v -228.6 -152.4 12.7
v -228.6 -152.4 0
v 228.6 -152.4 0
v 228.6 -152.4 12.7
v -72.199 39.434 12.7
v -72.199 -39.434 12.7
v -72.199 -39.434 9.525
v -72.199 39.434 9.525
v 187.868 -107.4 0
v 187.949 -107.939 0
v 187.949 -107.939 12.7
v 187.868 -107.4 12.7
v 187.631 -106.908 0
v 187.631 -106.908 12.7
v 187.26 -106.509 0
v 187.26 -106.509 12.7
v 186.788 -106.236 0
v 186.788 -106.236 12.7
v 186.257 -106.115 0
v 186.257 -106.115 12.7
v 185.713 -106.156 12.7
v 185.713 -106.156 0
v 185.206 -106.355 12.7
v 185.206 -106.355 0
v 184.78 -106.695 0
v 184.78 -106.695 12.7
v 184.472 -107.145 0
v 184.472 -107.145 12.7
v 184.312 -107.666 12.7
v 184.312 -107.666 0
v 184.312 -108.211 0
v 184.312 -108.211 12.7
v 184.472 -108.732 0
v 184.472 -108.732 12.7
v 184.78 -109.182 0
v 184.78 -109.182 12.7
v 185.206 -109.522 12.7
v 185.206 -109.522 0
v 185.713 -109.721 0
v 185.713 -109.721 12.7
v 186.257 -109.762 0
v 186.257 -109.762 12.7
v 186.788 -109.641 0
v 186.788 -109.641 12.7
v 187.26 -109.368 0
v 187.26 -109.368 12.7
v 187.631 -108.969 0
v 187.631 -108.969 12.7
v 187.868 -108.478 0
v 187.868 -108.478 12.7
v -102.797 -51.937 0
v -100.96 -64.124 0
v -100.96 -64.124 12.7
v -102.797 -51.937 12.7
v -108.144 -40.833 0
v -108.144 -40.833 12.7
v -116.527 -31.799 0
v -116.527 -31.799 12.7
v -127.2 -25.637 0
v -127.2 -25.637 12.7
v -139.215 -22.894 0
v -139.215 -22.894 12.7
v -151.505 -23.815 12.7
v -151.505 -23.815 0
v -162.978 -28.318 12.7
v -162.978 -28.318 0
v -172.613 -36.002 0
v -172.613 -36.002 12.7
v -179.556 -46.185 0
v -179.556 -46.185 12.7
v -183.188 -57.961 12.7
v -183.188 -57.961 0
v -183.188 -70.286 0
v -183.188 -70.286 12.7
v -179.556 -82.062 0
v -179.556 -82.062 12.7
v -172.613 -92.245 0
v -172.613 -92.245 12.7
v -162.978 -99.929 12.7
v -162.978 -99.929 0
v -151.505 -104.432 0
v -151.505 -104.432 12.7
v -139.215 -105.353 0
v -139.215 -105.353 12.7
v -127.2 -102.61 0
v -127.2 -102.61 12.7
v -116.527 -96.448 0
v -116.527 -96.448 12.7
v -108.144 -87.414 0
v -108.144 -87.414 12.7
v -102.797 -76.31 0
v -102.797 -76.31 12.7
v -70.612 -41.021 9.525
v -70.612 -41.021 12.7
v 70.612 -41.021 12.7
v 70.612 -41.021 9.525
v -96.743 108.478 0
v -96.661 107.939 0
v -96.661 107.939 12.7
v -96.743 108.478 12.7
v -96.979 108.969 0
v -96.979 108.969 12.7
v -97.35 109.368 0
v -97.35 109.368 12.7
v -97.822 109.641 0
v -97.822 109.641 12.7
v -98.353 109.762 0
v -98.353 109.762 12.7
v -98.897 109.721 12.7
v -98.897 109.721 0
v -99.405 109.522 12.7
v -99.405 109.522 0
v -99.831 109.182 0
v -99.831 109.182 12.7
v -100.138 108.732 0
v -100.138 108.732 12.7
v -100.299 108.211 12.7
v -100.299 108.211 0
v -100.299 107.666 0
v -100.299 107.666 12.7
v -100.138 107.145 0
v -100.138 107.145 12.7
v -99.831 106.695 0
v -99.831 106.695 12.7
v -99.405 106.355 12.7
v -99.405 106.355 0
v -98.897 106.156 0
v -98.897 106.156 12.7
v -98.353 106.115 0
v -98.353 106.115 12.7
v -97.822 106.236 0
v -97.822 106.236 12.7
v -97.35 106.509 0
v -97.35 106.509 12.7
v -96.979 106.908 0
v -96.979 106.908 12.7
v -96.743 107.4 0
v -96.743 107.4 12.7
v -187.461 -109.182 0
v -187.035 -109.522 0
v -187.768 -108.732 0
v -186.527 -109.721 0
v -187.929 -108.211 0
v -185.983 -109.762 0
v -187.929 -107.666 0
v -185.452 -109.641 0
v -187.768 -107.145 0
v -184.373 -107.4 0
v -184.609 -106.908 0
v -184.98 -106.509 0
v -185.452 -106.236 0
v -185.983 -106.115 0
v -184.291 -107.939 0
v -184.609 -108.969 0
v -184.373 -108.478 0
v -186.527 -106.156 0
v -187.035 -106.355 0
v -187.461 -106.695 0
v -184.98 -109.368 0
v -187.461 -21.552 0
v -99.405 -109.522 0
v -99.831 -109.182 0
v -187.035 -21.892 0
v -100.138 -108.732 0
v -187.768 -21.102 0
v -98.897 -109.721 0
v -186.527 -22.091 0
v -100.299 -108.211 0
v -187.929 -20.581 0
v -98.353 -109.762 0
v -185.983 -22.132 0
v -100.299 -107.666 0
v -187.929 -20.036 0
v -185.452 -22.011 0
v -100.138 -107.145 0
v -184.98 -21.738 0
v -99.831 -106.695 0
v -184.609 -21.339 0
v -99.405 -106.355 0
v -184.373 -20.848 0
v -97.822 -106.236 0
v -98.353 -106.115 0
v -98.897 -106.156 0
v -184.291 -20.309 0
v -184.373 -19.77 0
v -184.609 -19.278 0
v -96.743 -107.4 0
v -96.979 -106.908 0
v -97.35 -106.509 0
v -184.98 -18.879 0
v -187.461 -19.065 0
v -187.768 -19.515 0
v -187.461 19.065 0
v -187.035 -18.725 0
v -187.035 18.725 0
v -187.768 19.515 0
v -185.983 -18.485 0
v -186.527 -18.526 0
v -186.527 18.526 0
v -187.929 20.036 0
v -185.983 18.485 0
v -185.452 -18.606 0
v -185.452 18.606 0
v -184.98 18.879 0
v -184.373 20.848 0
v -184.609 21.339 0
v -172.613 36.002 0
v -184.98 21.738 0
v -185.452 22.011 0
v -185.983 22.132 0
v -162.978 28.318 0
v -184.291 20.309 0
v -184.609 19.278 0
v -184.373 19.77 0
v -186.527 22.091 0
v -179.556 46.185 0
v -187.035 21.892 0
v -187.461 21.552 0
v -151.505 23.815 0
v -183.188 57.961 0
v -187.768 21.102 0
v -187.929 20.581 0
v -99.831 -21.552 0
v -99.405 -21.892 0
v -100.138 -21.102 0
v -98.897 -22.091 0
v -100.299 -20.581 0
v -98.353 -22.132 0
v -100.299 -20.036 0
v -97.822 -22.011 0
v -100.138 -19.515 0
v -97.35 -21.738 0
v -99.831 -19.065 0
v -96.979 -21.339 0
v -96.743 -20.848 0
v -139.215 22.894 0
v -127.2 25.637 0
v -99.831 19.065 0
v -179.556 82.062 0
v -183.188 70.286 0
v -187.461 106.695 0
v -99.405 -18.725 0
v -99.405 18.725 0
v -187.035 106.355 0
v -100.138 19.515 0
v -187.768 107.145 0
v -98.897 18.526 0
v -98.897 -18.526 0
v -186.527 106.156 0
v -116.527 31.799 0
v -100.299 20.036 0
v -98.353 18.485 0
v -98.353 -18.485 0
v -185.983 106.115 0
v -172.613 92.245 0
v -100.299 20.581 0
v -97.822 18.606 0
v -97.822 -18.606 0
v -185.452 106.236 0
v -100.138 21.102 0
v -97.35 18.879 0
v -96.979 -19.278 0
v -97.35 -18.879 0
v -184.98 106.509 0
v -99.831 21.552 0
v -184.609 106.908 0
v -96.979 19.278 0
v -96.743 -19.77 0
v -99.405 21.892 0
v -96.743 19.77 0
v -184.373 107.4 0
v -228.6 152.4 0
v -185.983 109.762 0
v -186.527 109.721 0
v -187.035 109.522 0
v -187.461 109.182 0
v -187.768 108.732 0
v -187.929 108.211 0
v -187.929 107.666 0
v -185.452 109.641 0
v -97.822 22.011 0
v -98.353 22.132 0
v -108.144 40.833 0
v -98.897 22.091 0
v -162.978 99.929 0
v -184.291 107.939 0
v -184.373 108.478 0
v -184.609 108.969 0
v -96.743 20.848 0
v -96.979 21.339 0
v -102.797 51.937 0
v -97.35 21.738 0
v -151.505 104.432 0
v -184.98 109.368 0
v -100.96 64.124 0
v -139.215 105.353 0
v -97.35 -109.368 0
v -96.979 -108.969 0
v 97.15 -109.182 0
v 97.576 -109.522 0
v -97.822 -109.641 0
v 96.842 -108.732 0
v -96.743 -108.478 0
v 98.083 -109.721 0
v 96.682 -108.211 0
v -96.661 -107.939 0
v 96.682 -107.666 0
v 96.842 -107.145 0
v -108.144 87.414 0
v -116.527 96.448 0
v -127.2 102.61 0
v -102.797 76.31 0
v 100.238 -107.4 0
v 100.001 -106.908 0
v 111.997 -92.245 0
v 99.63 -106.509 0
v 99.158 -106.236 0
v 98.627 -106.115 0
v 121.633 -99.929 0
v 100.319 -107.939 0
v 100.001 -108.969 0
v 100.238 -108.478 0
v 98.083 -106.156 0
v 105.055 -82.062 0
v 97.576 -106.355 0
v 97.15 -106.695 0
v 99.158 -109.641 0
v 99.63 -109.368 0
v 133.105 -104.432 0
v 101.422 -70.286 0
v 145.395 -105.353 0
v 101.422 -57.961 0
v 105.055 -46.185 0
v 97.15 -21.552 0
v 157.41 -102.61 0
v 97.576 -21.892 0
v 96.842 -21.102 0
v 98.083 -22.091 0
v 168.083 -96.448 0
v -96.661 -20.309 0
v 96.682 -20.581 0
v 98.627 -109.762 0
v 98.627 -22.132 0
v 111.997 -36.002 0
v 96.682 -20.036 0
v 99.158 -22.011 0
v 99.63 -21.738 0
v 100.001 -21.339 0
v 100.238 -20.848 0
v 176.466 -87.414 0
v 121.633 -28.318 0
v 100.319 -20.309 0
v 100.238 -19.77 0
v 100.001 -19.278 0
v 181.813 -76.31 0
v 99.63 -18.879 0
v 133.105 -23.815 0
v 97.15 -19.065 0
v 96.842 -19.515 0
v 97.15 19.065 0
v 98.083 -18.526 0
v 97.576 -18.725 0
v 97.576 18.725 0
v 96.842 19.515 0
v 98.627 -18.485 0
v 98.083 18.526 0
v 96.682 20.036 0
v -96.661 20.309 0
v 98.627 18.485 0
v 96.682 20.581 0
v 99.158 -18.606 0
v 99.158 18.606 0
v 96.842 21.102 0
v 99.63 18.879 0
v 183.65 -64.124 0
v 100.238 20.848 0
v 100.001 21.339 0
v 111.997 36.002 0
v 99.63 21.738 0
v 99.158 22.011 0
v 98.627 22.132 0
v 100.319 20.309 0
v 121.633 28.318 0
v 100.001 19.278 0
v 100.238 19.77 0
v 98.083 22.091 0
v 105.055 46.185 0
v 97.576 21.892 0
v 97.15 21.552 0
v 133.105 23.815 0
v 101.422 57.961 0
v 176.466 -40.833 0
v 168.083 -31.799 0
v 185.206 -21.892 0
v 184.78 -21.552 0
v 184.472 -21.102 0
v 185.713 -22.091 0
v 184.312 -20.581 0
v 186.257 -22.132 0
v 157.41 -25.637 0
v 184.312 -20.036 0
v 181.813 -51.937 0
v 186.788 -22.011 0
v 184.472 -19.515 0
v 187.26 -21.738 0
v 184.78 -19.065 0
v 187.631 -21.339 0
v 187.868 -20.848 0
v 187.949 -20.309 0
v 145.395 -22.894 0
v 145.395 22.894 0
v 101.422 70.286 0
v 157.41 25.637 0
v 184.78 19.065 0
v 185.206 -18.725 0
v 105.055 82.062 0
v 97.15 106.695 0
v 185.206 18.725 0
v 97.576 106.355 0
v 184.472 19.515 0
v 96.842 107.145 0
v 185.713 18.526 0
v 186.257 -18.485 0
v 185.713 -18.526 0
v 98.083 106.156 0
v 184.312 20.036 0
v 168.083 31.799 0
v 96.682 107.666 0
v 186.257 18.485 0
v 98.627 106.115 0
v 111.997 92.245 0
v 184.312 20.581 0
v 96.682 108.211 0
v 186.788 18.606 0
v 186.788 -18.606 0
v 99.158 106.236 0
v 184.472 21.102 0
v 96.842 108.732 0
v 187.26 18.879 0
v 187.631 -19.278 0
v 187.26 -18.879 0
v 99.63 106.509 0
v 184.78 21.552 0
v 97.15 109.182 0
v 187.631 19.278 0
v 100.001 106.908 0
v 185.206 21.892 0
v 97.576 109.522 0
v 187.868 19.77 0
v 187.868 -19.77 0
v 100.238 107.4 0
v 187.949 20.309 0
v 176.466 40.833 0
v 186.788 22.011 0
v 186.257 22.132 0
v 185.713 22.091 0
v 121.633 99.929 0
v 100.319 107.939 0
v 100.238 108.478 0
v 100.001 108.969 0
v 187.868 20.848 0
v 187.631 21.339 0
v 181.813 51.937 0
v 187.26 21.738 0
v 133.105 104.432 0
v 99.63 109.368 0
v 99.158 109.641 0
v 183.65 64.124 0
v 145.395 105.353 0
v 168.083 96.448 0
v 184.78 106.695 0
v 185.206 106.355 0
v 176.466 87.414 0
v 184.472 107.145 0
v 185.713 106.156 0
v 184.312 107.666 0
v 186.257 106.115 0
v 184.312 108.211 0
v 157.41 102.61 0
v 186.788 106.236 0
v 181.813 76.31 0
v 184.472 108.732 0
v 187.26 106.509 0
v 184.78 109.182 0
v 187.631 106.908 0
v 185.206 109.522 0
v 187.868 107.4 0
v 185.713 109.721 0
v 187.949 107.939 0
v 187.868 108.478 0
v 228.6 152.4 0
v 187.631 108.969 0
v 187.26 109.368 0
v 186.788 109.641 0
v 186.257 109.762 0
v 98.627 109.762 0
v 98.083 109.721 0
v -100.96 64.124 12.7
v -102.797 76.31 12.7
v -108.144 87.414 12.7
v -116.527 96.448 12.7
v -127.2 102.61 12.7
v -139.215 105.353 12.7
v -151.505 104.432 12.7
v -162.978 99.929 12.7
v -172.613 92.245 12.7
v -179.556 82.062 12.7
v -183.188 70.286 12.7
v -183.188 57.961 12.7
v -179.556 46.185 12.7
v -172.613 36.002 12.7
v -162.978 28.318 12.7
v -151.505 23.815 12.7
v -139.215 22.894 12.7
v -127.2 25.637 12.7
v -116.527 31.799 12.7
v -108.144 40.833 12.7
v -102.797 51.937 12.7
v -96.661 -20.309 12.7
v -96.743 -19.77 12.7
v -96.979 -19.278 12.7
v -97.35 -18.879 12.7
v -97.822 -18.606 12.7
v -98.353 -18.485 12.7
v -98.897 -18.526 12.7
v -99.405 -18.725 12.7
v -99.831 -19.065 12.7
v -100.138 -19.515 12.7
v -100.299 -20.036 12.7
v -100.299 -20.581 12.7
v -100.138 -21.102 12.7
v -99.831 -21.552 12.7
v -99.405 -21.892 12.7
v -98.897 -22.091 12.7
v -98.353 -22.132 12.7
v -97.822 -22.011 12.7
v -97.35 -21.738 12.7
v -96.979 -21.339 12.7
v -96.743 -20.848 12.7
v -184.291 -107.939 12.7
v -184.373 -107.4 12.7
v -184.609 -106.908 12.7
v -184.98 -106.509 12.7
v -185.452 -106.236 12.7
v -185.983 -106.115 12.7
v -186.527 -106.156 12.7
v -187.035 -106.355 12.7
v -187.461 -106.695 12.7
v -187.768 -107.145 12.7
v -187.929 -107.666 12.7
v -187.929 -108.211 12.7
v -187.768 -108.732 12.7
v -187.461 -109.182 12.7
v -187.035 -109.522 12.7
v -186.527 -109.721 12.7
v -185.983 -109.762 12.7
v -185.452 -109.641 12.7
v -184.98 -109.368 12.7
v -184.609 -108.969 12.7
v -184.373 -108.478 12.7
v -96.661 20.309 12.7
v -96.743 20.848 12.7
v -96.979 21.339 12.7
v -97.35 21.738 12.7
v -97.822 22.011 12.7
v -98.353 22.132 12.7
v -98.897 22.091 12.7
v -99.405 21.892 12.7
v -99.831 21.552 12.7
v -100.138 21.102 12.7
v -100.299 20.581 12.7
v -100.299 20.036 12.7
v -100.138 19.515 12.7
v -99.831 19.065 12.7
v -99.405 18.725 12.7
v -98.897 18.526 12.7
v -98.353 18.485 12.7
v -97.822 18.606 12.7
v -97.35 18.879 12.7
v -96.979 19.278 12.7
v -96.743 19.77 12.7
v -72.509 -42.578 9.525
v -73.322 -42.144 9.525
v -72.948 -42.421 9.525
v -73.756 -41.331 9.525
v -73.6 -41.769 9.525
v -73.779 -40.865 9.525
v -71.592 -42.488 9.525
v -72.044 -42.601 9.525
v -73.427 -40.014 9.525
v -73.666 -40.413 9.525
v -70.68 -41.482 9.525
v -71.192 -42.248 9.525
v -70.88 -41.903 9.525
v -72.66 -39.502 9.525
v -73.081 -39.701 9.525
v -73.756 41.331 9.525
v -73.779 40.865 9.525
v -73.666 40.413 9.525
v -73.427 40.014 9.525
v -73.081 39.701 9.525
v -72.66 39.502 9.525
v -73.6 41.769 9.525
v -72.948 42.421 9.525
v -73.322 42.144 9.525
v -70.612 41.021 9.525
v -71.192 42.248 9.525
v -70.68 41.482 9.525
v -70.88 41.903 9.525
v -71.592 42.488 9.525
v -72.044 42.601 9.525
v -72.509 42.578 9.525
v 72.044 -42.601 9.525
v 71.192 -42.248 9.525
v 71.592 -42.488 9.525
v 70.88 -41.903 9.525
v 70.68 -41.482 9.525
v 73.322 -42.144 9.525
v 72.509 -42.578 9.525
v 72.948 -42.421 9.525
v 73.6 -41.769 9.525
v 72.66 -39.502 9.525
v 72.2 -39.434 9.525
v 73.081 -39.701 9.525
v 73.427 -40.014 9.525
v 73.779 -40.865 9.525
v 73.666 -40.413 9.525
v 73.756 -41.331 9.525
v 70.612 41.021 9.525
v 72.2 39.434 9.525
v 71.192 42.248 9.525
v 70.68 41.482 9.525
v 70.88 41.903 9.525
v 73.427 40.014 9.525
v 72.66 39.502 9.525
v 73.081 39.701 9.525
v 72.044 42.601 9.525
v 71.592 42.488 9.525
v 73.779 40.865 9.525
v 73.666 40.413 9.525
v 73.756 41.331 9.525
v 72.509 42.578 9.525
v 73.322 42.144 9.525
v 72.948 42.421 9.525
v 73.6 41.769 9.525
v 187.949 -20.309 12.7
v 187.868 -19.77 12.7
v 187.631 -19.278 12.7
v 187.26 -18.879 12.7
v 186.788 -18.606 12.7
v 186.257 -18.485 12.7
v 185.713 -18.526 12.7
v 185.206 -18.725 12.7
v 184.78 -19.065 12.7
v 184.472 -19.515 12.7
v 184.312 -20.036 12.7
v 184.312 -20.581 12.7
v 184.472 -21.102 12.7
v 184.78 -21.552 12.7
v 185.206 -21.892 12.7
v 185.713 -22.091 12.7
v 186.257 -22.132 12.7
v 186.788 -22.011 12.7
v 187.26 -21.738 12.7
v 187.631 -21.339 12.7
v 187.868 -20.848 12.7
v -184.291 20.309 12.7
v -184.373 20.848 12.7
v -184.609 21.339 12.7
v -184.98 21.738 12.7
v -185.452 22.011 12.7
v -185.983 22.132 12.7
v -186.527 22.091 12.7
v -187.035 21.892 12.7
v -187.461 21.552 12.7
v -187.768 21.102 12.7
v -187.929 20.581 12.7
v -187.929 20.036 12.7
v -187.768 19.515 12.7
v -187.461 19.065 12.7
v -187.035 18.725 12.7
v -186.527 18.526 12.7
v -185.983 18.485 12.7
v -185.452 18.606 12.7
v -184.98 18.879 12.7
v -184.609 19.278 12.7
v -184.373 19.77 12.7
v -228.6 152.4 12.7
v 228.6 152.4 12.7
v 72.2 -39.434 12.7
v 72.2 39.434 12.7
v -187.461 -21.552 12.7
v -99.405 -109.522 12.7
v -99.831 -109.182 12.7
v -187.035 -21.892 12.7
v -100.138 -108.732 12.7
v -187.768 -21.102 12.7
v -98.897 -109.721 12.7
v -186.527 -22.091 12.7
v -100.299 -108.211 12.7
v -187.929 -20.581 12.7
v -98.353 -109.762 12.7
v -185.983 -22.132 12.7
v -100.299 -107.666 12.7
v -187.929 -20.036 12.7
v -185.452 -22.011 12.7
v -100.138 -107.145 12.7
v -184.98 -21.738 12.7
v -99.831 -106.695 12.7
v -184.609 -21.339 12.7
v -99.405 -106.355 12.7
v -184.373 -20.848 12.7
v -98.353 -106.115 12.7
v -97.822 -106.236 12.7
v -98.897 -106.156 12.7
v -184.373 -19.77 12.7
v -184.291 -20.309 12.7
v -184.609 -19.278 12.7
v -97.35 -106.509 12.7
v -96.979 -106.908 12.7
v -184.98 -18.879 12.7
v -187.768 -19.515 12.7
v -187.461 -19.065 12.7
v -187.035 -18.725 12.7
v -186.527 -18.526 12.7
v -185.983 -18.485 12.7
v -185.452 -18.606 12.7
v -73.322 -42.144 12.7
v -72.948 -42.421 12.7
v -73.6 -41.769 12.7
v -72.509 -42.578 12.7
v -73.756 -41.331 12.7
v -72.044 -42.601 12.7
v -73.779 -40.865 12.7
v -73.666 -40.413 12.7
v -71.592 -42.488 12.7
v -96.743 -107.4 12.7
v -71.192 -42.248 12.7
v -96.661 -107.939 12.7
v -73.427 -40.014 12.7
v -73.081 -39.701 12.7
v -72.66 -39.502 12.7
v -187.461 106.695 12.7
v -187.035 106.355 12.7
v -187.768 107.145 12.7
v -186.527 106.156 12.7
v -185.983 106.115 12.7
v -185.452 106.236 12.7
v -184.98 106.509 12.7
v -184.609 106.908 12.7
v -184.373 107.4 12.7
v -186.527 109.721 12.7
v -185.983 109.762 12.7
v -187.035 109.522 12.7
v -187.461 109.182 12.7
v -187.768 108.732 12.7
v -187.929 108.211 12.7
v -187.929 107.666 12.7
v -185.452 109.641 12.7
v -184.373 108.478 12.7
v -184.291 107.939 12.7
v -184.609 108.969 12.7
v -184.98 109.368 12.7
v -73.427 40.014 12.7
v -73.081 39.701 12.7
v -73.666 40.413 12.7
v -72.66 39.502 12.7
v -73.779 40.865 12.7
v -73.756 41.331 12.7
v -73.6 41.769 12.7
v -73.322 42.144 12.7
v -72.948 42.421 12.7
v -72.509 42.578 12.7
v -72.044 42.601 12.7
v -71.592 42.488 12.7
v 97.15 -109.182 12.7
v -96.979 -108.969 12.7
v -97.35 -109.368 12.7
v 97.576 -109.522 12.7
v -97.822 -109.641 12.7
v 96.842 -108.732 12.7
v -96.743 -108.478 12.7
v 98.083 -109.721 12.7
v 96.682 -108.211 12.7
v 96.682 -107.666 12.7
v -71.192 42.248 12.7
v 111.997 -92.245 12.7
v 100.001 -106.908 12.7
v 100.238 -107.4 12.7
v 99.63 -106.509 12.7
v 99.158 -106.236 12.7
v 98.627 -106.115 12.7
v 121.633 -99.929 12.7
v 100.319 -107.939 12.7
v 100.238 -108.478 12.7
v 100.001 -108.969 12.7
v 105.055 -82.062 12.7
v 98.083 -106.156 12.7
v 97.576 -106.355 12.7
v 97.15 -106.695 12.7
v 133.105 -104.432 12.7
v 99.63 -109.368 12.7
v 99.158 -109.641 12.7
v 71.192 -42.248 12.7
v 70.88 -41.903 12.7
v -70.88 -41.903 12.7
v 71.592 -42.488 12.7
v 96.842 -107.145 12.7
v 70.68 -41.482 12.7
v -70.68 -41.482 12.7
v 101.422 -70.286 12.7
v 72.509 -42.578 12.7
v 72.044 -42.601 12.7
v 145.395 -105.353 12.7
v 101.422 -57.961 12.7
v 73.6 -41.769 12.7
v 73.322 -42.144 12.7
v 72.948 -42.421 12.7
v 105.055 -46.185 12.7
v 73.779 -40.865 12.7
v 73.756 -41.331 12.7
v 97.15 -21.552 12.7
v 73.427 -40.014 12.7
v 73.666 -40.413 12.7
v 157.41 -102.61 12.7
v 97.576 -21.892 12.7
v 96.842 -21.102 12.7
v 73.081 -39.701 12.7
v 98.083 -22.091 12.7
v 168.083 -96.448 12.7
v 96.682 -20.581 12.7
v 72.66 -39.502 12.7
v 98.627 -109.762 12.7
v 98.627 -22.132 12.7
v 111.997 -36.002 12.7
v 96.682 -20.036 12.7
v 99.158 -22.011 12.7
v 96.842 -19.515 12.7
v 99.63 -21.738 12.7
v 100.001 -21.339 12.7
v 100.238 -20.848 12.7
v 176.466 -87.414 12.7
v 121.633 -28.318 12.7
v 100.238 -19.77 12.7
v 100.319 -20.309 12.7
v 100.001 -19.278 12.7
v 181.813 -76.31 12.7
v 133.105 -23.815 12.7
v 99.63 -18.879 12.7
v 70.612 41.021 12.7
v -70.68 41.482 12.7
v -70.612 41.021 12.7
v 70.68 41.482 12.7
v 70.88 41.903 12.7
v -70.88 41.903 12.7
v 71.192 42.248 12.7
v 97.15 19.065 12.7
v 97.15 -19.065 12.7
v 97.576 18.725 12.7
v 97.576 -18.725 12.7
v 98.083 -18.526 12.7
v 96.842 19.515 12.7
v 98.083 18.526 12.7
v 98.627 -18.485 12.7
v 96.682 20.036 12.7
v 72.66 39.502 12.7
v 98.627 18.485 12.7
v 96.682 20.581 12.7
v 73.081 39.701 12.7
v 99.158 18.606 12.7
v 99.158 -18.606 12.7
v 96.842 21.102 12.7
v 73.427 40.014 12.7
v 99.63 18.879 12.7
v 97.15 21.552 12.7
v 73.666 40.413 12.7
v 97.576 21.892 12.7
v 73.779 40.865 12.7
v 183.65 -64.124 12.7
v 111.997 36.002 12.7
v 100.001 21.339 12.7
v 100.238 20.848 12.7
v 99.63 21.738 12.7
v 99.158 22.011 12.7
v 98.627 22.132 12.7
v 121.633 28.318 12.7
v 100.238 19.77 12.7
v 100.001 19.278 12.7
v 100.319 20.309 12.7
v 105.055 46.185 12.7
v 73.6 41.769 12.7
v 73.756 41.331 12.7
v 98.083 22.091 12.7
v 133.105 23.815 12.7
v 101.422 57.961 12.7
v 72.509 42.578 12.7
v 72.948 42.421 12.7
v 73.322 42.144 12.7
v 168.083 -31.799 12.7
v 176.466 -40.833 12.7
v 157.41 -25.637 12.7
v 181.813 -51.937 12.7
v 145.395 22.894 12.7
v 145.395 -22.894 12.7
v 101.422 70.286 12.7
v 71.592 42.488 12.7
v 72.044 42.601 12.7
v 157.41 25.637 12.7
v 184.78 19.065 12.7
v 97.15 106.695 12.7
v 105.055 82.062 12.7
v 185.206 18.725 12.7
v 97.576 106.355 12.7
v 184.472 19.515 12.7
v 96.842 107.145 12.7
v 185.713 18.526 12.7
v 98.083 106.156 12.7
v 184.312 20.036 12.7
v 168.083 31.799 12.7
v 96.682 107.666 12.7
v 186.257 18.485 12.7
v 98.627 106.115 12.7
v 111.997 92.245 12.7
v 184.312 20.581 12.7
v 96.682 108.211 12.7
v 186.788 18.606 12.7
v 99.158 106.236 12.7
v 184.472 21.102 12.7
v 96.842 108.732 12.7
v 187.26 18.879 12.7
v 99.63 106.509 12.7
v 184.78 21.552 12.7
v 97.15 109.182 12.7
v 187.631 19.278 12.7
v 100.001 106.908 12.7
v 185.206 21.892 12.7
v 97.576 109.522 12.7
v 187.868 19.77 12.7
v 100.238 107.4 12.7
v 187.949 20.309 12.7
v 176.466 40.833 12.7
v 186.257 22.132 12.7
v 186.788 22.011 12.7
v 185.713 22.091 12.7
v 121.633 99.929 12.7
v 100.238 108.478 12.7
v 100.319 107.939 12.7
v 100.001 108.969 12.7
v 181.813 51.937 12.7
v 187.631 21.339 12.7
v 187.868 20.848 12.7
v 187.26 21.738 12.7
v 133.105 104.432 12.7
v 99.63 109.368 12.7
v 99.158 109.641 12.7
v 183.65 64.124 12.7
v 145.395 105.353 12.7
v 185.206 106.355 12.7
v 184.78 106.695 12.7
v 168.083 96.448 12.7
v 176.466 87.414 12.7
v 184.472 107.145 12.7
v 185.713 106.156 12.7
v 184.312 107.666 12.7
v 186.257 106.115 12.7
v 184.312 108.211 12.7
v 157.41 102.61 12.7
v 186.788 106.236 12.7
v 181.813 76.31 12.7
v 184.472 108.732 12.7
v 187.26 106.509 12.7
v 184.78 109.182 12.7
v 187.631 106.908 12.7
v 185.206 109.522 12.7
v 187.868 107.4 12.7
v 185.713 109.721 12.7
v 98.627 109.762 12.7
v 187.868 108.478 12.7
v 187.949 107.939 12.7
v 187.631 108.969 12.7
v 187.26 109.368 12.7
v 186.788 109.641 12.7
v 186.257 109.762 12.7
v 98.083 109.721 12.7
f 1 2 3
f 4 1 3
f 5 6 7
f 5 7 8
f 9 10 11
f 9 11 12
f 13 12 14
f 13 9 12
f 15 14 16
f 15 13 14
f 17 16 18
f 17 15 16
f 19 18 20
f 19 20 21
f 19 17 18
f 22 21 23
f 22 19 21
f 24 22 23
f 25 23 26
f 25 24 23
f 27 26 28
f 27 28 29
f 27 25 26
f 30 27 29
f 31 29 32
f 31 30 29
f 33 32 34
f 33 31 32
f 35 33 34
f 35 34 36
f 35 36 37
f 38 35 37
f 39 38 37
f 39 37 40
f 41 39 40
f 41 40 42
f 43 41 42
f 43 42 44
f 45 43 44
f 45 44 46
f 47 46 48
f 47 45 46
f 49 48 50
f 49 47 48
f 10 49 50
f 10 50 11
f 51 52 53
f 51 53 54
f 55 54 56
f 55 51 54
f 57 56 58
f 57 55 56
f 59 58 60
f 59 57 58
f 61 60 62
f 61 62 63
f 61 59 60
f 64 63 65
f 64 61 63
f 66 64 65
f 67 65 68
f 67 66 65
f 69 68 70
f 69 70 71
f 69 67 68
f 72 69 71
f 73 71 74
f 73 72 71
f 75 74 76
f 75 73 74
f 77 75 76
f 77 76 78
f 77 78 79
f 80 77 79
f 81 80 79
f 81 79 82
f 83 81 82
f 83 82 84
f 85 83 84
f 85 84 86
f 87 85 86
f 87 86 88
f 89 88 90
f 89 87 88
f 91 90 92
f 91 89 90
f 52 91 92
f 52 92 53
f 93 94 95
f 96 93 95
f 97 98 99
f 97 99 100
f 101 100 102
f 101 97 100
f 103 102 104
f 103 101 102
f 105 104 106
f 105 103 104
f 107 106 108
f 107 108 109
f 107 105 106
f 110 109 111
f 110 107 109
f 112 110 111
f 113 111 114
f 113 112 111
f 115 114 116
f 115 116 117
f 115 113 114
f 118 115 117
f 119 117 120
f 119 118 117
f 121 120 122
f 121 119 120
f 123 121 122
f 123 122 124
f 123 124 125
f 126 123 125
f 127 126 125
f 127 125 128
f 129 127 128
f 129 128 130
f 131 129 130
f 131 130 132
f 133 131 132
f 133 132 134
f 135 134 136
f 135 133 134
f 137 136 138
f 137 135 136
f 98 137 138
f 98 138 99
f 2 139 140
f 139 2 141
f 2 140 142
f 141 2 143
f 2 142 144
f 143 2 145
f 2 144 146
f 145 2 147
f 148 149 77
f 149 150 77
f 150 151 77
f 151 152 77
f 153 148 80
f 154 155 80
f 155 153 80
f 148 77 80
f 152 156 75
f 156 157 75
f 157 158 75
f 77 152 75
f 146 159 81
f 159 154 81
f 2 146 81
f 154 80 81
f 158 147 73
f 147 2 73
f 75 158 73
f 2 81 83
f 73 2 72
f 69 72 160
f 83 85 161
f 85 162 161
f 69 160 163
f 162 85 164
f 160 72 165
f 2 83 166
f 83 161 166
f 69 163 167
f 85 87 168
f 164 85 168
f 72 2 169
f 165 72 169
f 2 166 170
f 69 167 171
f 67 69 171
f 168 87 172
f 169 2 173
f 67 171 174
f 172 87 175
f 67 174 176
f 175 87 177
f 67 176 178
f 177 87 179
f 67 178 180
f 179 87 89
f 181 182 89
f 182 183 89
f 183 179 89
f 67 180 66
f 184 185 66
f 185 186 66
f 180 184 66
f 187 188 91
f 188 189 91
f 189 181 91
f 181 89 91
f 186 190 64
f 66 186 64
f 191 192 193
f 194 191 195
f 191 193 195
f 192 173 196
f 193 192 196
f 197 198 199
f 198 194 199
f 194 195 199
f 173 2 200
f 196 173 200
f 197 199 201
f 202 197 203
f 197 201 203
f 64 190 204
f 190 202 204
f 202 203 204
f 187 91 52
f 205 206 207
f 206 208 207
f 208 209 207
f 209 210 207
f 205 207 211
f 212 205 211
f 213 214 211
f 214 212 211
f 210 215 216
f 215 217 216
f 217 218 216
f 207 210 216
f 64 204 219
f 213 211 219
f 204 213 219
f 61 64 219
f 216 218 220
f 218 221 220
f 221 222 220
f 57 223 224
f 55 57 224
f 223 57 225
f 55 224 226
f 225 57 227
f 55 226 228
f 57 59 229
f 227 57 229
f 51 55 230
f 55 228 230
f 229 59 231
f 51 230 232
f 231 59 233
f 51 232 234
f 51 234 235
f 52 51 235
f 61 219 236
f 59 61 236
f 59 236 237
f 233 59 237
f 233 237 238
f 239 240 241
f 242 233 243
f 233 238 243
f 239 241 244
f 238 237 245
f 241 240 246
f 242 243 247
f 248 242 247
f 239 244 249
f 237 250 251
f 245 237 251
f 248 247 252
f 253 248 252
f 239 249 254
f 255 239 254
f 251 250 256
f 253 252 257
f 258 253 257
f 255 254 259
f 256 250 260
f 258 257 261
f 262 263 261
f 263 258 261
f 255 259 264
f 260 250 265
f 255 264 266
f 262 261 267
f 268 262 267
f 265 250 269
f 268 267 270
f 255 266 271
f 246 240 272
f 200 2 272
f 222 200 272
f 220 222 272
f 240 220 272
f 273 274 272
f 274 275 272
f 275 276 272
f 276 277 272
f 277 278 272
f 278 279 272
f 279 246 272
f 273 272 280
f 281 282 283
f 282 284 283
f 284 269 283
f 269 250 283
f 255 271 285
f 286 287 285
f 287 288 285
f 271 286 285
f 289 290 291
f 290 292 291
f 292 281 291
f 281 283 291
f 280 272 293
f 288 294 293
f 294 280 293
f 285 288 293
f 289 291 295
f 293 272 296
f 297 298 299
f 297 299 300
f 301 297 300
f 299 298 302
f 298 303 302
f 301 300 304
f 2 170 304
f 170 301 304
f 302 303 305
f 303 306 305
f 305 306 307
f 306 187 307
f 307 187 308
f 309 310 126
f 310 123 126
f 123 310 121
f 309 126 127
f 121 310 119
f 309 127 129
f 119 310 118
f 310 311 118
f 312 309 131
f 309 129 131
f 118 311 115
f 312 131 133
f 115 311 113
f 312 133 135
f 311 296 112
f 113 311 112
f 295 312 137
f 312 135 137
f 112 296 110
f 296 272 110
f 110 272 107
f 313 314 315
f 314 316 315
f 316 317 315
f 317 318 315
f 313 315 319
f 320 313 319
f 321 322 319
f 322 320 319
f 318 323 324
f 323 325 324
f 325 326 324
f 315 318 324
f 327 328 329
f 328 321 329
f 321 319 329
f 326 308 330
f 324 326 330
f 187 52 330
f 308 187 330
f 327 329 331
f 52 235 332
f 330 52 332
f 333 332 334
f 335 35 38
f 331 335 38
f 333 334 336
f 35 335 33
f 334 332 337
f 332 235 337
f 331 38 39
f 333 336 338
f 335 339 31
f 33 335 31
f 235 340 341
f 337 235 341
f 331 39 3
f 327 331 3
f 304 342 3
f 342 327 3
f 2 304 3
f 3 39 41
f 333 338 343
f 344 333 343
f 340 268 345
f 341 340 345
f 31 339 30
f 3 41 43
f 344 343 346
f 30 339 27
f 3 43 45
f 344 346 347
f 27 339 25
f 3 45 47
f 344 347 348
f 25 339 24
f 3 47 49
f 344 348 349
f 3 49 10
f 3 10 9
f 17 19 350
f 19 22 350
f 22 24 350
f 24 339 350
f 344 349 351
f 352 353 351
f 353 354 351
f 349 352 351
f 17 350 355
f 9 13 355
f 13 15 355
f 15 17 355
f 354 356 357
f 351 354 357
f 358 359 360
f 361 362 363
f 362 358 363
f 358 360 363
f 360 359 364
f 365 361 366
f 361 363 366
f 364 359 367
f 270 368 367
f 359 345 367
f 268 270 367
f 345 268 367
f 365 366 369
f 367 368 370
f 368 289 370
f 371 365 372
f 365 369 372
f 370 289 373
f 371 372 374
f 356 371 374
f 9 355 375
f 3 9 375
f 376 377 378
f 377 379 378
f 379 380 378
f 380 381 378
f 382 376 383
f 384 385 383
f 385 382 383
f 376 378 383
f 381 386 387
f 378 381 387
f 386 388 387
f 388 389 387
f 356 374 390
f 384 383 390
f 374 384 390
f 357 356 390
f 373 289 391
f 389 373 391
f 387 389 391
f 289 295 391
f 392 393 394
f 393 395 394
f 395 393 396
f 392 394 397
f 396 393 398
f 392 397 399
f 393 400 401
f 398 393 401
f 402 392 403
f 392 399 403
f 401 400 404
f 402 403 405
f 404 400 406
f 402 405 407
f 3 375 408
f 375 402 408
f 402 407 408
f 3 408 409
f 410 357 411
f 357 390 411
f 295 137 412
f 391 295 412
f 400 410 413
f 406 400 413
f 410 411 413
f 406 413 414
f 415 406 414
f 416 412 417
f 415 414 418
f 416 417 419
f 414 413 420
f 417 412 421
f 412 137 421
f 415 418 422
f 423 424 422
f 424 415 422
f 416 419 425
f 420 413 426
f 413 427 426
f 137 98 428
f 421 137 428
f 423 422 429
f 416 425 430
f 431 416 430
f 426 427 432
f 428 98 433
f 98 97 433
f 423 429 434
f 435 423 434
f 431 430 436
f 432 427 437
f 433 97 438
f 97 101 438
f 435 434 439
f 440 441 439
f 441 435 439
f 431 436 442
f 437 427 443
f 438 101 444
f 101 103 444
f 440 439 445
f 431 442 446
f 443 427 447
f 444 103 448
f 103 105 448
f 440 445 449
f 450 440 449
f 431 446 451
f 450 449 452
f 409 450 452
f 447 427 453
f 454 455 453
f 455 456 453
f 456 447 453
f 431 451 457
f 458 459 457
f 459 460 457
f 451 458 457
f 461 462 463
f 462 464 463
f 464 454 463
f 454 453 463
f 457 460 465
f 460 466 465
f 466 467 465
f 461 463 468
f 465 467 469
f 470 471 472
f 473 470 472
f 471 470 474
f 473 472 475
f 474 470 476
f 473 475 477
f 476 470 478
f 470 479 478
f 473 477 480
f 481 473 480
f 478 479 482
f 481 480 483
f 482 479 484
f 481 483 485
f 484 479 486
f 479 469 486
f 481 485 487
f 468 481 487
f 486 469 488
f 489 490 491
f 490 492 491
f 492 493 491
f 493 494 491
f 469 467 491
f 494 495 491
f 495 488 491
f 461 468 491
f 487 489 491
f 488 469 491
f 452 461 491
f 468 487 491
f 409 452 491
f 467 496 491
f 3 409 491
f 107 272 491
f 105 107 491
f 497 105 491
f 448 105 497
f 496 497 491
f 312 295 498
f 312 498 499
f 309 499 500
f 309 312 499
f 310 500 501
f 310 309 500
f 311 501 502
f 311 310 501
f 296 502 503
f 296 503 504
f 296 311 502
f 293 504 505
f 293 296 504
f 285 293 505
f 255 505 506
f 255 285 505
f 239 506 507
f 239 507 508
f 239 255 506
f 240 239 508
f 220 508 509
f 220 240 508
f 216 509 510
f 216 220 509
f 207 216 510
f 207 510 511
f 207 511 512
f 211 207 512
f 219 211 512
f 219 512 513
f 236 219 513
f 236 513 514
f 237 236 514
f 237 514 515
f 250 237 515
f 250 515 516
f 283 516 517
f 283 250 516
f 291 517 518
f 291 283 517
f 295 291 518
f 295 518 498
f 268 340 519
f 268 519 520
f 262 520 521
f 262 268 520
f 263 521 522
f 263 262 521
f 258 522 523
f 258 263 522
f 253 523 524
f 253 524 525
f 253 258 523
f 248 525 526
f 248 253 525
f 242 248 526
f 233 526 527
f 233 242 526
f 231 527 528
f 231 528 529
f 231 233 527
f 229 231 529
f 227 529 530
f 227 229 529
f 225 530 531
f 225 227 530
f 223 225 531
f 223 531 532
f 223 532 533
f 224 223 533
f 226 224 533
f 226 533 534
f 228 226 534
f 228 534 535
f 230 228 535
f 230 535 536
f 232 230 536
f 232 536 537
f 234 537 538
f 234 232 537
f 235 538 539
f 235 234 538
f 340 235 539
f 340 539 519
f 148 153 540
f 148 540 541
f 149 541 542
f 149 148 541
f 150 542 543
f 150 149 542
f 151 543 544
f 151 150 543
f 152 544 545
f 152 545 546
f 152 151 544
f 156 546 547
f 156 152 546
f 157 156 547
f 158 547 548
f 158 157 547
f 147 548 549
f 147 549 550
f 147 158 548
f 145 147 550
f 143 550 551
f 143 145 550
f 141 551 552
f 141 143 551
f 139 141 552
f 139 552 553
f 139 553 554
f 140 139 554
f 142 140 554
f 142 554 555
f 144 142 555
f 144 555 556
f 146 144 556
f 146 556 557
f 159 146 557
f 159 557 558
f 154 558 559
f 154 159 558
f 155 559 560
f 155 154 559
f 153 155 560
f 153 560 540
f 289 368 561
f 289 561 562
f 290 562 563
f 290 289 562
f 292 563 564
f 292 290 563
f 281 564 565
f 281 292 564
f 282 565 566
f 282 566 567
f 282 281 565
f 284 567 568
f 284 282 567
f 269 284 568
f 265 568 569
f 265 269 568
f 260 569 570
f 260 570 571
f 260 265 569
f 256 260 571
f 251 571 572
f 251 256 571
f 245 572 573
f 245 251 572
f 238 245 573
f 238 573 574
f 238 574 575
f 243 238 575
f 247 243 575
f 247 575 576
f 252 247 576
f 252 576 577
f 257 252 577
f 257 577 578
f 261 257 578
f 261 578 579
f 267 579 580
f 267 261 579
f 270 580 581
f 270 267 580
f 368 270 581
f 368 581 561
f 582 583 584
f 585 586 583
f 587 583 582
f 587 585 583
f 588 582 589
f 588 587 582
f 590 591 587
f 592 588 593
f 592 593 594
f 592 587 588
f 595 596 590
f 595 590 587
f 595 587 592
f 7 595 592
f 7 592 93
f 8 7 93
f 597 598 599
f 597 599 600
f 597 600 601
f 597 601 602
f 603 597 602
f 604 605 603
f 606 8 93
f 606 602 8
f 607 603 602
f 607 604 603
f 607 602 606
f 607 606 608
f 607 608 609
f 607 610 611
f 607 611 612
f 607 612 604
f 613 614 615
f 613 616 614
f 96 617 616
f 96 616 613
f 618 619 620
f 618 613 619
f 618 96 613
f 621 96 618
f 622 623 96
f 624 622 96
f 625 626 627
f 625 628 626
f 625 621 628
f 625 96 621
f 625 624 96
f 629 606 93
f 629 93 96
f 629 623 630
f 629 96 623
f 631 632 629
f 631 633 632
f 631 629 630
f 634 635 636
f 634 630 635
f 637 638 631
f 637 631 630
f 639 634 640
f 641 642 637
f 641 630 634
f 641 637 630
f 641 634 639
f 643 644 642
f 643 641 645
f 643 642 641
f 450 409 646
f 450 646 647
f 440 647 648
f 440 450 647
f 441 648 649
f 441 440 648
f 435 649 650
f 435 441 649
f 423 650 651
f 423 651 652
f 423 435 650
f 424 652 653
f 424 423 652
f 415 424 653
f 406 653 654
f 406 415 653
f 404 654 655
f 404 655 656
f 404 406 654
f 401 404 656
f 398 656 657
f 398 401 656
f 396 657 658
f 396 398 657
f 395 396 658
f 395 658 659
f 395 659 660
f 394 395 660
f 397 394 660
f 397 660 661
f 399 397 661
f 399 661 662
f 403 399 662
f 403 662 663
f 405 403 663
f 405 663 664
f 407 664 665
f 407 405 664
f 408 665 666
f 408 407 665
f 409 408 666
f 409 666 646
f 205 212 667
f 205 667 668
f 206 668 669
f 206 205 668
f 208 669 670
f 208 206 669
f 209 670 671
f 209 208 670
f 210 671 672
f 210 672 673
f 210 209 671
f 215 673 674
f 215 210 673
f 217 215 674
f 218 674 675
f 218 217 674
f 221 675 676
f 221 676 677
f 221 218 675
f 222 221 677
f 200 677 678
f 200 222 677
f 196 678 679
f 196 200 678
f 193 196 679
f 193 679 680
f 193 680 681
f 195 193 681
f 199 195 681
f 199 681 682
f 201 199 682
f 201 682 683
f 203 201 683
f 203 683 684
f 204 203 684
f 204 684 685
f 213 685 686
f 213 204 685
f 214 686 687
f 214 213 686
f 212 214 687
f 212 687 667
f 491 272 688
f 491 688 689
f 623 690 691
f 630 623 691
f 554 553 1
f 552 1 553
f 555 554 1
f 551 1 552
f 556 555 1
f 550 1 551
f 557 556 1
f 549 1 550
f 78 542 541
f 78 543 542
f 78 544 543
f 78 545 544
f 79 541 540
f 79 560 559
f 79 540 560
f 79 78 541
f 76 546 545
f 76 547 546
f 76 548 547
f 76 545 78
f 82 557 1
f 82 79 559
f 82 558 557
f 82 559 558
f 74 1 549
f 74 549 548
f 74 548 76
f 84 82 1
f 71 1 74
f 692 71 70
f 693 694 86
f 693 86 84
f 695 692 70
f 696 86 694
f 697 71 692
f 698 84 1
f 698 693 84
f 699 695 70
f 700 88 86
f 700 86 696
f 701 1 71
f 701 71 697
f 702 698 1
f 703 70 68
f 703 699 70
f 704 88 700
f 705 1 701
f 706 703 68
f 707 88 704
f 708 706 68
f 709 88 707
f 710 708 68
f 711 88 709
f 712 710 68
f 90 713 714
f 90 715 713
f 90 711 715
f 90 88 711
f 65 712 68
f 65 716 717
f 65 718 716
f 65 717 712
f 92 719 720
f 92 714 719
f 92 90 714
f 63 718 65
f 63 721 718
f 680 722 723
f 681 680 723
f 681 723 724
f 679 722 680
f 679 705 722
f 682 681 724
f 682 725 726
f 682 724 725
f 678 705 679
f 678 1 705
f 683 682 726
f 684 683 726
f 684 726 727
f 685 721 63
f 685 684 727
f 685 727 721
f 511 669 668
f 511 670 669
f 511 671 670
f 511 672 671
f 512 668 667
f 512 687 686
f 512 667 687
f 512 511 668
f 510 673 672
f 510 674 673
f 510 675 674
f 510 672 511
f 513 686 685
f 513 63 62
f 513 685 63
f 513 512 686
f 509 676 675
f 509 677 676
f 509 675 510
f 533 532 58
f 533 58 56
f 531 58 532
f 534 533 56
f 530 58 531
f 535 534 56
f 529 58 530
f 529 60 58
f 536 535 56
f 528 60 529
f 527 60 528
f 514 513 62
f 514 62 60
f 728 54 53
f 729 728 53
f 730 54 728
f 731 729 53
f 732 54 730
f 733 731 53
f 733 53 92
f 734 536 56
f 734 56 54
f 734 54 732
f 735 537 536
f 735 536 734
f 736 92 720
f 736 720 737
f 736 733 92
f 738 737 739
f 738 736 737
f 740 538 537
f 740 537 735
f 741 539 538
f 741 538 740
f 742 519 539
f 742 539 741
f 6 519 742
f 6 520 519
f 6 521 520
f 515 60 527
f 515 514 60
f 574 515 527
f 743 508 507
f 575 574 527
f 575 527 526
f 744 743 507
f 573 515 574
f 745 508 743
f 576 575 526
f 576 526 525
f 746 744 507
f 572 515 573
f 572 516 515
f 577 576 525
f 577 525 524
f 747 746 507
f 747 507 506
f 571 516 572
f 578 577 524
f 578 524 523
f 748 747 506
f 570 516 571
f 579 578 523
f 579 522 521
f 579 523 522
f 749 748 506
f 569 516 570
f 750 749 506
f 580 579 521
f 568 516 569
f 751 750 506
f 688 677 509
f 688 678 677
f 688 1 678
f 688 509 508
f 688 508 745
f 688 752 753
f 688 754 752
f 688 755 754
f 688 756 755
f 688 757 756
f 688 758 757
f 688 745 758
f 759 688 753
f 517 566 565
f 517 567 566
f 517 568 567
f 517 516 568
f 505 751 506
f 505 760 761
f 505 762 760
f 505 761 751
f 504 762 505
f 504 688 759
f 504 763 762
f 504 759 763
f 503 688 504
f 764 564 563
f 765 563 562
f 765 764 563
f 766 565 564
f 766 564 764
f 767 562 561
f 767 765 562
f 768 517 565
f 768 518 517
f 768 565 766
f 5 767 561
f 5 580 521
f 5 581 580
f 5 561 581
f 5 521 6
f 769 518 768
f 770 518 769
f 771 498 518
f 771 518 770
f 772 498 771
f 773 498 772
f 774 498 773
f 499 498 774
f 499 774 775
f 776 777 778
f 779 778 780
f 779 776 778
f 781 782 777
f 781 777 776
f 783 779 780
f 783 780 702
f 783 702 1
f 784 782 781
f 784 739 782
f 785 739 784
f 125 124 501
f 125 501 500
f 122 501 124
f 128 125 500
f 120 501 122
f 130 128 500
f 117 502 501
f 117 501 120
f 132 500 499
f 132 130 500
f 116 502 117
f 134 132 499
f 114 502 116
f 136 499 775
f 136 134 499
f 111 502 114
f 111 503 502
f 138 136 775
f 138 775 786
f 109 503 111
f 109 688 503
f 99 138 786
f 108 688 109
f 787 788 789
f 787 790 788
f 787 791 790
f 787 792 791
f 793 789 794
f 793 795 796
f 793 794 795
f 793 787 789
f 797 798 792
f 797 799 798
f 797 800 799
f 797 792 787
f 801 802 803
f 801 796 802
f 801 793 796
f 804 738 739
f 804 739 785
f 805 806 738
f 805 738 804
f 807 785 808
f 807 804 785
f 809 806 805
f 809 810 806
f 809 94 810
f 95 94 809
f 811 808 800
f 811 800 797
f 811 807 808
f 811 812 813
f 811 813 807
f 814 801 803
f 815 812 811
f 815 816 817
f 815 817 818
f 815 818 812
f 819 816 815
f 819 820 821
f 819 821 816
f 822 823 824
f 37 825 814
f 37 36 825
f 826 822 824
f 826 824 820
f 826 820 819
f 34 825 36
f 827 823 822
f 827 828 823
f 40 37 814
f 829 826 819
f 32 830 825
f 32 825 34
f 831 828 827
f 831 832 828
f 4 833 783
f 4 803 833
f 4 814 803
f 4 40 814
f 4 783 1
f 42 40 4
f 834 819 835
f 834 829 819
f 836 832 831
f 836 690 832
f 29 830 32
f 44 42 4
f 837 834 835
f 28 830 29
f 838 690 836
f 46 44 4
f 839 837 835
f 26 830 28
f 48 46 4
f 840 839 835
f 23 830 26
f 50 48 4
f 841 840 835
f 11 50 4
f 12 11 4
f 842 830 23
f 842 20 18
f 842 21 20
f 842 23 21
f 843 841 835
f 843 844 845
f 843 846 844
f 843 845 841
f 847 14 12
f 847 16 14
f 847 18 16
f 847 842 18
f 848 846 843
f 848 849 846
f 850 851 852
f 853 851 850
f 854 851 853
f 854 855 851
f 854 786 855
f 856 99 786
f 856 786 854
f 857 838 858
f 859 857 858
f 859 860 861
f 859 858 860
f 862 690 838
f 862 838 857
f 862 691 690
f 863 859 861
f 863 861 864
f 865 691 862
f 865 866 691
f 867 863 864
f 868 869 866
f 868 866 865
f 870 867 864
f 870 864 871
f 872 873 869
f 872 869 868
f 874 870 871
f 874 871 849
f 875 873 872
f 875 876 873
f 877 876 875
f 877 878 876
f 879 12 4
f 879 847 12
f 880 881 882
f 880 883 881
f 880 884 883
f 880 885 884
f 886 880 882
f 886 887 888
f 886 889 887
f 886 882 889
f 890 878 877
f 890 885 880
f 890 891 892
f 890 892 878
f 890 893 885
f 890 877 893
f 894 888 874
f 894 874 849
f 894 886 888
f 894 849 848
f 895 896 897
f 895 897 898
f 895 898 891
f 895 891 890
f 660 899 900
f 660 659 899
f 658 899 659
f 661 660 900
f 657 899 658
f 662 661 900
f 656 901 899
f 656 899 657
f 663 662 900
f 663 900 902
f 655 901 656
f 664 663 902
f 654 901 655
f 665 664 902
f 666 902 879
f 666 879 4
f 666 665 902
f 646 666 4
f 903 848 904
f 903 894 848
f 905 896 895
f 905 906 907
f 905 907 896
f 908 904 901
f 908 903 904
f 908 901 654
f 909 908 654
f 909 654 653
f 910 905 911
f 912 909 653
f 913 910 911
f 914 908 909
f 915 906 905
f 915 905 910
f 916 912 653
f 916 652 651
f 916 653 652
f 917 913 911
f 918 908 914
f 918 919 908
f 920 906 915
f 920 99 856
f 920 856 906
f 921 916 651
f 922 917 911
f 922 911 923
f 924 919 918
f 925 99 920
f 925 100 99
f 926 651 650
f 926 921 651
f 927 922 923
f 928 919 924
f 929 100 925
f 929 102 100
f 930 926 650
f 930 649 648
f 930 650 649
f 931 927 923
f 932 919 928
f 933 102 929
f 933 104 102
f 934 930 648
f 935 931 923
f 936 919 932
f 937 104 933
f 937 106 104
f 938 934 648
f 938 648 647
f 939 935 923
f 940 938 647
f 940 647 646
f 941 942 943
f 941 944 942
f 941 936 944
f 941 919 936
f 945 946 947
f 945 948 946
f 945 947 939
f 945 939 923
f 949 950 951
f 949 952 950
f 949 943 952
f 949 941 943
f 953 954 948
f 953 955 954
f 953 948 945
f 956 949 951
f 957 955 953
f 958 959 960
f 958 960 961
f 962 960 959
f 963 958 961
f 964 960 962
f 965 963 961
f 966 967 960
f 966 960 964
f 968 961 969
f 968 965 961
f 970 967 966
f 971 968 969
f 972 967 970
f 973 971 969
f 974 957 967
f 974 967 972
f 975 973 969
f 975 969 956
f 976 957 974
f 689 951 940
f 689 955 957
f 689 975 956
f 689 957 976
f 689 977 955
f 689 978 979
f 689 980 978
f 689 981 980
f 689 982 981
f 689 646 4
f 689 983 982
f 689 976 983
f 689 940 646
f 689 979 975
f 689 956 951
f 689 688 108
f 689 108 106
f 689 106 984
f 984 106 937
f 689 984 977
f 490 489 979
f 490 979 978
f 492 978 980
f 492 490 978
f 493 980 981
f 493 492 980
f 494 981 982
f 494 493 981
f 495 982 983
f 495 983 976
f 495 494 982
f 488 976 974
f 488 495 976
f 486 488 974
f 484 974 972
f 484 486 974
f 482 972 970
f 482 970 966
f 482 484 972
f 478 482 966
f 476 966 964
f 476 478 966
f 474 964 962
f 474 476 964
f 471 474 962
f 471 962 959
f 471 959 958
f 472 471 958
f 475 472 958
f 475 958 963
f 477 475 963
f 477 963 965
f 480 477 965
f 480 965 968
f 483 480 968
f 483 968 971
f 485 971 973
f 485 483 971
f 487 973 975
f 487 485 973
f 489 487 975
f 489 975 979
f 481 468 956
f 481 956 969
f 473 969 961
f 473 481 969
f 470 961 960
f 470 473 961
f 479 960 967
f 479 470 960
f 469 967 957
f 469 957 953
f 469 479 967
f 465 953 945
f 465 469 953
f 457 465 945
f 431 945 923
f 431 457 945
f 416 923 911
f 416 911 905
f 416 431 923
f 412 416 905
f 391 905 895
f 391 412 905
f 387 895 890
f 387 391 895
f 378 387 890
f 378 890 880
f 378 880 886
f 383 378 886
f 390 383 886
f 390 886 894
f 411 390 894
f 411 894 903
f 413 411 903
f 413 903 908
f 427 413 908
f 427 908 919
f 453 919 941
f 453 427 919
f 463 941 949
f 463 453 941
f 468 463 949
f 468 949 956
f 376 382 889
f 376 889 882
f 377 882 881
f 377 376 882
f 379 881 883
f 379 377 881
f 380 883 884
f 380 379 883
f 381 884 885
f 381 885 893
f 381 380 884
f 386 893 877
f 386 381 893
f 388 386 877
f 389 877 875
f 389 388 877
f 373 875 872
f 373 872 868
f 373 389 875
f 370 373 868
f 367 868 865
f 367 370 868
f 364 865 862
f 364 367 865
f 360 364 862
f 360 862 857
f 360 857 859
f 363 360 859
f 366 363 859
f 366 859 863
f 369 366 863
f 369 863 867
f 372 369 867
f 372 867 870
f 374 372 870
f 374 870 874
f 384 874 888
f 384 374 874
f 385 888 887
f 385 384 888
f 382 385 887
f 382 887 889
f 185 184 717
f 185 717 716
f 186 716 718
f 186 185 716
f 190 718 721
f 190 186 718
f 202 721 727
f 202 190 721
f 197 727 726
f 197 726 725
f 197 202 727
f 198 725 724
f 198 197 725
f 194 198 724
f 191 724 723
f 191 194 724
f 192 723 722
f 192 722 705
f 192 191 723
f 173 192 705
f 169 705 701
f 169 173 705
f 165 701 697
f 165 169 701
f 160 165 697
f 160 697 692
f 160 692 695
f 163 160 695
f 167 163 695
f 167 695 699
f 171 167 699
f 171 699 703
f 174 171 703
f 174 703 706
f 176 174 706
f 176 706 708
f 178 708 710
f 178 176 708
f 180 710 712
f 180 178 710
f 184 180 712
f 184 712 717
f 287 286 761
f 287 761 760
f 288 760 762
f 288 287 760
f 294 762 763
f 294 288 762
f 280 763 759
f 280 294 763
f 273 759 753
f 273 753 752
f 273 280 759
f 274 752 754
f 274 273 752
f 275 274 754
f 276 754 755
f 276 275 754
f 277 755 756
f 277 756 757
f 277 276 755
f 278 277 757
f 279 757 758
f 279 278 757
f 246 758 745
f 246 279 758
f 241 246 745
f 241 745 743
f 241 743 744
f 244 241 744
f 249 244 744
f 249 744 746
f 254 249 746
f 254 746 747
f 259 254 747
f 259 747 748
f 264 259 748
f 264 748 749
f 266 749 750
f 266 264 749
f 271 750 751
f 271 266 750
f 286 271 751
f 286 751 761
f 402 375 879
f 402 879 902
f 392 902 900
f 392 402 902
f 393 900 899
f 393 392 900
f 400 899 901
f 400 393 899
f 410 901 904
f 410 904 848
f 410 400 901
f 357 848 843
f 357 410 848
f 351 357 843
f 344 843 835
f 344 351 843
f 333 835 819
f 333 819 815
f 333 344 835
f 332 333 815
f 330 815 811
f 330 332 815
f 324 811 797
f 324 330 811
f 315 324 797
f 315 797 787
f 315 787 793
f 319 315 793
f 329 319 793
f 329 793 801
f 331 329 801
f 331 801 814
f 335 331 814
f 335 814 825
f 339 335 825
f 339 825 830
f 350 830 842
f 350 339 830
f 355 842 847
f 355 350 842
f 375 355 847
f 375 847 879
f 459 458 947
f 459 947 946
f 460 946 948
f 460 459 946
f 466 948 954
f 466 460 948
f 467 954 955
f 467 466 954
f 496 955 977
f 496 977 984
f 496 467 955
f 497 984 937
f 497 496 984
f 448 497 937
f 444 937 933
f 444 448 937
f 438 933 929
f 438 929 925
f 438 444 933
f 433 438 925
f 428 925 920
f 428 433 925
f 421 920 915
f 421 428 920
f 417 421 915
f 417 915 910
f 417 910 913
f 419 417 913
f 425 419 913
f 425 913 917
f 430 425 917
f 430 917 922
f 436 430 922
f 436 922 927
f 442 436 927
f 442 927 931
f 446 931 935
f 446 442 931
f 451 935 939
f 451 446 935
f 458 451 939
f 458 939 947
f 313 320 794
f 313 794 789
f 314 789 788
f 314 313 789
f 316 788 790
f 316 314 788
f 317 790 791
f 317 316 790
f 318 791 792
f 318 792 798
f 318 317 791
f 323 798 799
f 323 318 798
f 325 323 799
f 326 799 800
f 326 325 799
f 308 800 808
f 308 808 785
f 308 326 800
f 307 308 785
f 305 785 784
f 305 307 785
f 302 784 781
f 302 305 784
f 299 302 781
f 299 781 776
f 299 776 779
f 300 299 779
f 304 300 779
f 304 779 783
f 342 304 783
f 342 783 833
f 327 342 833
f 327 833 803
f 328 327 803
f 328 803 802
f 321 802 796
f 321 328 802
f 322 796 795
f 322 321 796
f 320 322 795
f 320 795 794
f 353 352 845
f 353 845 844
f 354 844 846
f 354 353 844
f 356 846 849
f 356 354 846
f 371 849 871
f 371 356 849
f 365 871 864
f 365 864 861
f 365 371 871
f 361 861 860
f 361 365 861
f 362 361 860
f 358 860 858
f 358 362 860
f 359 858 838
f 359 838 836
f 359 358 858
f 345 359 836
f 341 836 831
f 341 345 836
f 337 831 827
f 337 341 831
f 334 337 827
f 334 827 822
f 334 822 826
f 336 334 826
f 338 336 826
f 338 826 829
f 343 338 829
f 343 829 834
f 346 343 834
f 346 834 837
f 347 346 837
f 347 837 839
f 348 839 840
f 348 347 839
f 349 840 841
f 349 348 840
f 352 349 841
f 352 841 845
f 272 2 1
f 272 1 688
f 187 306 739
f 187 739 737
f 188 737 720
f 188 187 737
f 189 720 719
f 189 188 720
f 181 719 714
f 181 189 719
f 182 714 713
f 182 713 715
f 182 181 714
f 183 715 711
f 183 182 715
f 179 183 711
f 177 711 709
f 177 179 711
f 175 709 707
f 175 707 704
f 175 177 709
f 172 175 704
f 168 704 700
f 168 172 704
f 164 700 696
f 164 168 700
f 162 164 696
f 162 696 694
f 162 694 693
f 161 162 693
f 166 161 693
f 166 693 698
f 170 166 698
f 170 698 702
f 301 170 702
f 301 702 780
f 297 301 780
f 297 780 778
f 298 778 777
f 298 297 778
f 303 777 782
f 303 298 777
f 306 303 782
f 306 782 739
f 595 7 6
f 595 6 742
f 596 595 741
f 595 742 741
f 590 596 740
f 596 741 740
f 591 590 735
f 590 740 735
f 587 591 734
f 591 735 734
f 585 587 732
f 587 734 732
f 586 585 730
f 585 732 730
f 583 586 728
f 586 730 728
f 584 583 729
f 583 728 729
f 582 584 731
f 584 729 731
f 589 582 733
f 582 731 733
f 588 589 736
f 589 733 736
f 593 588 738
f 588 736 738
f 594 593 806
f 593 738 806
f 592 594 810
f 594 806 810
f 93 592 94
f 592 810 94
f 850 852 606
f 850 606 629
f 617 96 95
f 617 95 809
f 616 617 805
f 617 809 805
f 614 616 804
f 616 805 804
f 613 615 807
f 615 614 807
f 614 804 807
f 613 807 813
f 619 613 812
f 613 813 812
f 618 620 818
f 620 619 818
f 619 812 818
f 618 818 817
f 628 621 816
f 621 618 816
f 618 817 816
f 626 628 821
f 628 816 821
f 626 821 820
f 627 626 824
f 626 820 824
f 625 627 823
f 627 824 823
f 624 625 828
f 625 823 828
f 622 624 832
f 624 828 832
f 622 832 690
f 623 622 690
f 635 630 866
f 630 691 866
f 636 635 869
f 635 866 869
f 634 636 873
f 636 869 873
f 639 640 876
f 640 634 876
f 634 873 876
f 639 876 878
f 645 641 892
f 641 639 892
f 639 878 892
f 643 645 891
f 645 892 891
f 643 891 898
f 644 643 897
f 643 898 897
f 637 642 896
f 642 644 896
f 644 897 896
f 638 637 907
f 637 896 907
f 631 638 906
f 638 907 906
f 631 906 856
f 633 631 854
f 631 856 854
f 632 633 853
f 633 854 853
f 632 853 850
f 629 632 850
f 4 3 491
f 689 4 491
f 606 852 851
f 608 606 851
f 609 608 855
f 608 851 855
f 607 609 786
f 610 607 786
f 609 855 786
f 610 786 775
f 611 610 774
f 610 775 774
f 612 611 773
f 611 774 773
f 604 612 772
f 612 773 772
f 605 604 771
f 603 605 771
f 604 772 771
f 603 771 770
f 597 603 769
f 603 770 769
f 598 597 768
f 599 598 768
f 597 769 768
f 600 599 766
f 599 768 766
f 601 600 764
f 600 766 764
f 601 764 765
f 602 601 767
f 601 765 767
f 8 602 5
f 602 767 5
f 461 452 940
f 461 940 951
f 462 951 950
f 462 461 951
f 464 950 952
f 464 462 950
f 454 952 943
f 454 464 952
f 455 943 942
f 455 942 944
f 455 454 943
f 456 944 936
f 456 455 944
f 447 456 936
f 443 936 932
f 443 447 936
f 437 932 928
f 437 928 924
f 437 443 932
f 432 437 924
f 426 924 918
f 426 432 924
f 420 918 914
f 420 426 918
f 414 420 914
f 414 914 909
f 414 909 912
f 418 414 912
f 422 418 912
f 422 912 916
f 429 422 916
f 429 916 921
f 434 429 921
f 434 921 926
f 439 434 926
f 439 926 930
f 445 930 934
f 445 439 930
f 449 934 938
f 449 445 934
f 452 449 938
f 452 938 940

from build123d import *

# Parameters (mm, degrees)
F0_W     = 457.2
F0_H     = 304.8
F0_R     = 1.8288
F0_R_2   = 41.34485
F1_DEPTH = 12.7
F2_W     = 144.399
F2_H     = 82.042
F3_DEPTH = 3.175
F4_R     = 1.5875
F5_DEPTH = 3.175


with BuildPart() as f1:
    # F0 (on Top) → F1 (new body)
    with BuildSketch(Plane.XY):
        Rectangle(F0_W, F0_H)
        with Locations((-186.120166, -107.938549)):
            Circle(F0_R, mode=Mode.SUBTRACT)
        with Locations((-98.490166, -107.938549)):
            Circle(F0_R, mode=Mode.SUBTRACT)
        with Locations((-142.305166, -64.123549)):
            Circle(F0_R_2, mode=Mode.SUBTRACT)
        with Locations((-186.120166, -20.308549)):
            Circle(F0_R, mode=Mode.SUBTRACT)
        with Locations((-98.490166, -20.308549)):
            Circle(F0_R, mode=Mode.SUBTRACT)
        with Locations((98.490166, -107.938549)):
            Circle(F0_R, mode=Mode.SUBTRACT)
        with Locations((186.120166, -107.938549)):
            Circle(F0_R, mode=Mode.SUBTRACT)
        with Locations((98.490166, -20.308549)):
            Circle(F0_R, mode=Mode.SUBTRACT)
        with Locations((142.305166, -64.123549)):
            Circle(F0_R_2, mode=Mode.SUBTRACT)
        with Locations((186.120166, -20.308549)):
            Circle(F0_R, mode=Mode.SUBTRACT)
        with Locations((-186.120166, 20.308549)):
            Circle(F0_R, mode=Mode.SUBTRACT)
        with Locations((-142.305166, 64.123549)):
            Circle(F0_R_2, mode=Mode.SUBTRACT)
        with Locations((-98.490166, 20.308549)):
            Circle(F0_R, mode=Mode.SUBTRACT)
        with Locations((-186.120166, 107.938549)):
            Circle(F0_R, mode=Mode.SUBTRACT)
        with Locations((-98.490166, 107.938549)):
            Circle(F0_R, mode=Mode.SUBTRACT)
        with Locations((98.490166, 20.308549)):
            Circle(F0_R, mode=Mode.SUBTRACT)
        with Locations((186.120166, 20.308549)):
            Circle(F0_R, mode=Mode.SUBTRACT)
        with Locations((142.305166, 64.123549)):
            Circle(F0_R_2, mode=Mode.SUBTRACT)
        with Locations((98.490166, 107.938549)):
            Circle(F0_R, mode=Mode.SUBTRACT)
        with Locations((186.120166, 107.938549)):
            Circle(F0_R, mode=Mode.SUBTRACT)
    extrude(amount=F1_DEPTH)

    # F2 (on face) → F3 (cut)
    with BuildSketch(Plane.XY.offset(12.7)):
        Rectangle(F2_W, F2_H)
    extrude(amount=-F3_DEPTH, mode=Mode.SUBTRACT)

    # F4 (on face) → F5 (cut, through all)
    with BuildSketch(Plane.XY.offset(12.7)):
        with Locations((-72.1995, 41.021)):
            Circle(F4_R)
        with Locations((72.1995, 41.021)):
            Circle(F4_R)
        with Locations((72.1995, -41.021)):
            Circle(F4_R)
        with Locations((-72.1995, -41.021)):
            Circle(F4_R)
    extrude(amount=-F5_DEPTH, mode=Mode.SUBTRACT)


solid = f1.part
